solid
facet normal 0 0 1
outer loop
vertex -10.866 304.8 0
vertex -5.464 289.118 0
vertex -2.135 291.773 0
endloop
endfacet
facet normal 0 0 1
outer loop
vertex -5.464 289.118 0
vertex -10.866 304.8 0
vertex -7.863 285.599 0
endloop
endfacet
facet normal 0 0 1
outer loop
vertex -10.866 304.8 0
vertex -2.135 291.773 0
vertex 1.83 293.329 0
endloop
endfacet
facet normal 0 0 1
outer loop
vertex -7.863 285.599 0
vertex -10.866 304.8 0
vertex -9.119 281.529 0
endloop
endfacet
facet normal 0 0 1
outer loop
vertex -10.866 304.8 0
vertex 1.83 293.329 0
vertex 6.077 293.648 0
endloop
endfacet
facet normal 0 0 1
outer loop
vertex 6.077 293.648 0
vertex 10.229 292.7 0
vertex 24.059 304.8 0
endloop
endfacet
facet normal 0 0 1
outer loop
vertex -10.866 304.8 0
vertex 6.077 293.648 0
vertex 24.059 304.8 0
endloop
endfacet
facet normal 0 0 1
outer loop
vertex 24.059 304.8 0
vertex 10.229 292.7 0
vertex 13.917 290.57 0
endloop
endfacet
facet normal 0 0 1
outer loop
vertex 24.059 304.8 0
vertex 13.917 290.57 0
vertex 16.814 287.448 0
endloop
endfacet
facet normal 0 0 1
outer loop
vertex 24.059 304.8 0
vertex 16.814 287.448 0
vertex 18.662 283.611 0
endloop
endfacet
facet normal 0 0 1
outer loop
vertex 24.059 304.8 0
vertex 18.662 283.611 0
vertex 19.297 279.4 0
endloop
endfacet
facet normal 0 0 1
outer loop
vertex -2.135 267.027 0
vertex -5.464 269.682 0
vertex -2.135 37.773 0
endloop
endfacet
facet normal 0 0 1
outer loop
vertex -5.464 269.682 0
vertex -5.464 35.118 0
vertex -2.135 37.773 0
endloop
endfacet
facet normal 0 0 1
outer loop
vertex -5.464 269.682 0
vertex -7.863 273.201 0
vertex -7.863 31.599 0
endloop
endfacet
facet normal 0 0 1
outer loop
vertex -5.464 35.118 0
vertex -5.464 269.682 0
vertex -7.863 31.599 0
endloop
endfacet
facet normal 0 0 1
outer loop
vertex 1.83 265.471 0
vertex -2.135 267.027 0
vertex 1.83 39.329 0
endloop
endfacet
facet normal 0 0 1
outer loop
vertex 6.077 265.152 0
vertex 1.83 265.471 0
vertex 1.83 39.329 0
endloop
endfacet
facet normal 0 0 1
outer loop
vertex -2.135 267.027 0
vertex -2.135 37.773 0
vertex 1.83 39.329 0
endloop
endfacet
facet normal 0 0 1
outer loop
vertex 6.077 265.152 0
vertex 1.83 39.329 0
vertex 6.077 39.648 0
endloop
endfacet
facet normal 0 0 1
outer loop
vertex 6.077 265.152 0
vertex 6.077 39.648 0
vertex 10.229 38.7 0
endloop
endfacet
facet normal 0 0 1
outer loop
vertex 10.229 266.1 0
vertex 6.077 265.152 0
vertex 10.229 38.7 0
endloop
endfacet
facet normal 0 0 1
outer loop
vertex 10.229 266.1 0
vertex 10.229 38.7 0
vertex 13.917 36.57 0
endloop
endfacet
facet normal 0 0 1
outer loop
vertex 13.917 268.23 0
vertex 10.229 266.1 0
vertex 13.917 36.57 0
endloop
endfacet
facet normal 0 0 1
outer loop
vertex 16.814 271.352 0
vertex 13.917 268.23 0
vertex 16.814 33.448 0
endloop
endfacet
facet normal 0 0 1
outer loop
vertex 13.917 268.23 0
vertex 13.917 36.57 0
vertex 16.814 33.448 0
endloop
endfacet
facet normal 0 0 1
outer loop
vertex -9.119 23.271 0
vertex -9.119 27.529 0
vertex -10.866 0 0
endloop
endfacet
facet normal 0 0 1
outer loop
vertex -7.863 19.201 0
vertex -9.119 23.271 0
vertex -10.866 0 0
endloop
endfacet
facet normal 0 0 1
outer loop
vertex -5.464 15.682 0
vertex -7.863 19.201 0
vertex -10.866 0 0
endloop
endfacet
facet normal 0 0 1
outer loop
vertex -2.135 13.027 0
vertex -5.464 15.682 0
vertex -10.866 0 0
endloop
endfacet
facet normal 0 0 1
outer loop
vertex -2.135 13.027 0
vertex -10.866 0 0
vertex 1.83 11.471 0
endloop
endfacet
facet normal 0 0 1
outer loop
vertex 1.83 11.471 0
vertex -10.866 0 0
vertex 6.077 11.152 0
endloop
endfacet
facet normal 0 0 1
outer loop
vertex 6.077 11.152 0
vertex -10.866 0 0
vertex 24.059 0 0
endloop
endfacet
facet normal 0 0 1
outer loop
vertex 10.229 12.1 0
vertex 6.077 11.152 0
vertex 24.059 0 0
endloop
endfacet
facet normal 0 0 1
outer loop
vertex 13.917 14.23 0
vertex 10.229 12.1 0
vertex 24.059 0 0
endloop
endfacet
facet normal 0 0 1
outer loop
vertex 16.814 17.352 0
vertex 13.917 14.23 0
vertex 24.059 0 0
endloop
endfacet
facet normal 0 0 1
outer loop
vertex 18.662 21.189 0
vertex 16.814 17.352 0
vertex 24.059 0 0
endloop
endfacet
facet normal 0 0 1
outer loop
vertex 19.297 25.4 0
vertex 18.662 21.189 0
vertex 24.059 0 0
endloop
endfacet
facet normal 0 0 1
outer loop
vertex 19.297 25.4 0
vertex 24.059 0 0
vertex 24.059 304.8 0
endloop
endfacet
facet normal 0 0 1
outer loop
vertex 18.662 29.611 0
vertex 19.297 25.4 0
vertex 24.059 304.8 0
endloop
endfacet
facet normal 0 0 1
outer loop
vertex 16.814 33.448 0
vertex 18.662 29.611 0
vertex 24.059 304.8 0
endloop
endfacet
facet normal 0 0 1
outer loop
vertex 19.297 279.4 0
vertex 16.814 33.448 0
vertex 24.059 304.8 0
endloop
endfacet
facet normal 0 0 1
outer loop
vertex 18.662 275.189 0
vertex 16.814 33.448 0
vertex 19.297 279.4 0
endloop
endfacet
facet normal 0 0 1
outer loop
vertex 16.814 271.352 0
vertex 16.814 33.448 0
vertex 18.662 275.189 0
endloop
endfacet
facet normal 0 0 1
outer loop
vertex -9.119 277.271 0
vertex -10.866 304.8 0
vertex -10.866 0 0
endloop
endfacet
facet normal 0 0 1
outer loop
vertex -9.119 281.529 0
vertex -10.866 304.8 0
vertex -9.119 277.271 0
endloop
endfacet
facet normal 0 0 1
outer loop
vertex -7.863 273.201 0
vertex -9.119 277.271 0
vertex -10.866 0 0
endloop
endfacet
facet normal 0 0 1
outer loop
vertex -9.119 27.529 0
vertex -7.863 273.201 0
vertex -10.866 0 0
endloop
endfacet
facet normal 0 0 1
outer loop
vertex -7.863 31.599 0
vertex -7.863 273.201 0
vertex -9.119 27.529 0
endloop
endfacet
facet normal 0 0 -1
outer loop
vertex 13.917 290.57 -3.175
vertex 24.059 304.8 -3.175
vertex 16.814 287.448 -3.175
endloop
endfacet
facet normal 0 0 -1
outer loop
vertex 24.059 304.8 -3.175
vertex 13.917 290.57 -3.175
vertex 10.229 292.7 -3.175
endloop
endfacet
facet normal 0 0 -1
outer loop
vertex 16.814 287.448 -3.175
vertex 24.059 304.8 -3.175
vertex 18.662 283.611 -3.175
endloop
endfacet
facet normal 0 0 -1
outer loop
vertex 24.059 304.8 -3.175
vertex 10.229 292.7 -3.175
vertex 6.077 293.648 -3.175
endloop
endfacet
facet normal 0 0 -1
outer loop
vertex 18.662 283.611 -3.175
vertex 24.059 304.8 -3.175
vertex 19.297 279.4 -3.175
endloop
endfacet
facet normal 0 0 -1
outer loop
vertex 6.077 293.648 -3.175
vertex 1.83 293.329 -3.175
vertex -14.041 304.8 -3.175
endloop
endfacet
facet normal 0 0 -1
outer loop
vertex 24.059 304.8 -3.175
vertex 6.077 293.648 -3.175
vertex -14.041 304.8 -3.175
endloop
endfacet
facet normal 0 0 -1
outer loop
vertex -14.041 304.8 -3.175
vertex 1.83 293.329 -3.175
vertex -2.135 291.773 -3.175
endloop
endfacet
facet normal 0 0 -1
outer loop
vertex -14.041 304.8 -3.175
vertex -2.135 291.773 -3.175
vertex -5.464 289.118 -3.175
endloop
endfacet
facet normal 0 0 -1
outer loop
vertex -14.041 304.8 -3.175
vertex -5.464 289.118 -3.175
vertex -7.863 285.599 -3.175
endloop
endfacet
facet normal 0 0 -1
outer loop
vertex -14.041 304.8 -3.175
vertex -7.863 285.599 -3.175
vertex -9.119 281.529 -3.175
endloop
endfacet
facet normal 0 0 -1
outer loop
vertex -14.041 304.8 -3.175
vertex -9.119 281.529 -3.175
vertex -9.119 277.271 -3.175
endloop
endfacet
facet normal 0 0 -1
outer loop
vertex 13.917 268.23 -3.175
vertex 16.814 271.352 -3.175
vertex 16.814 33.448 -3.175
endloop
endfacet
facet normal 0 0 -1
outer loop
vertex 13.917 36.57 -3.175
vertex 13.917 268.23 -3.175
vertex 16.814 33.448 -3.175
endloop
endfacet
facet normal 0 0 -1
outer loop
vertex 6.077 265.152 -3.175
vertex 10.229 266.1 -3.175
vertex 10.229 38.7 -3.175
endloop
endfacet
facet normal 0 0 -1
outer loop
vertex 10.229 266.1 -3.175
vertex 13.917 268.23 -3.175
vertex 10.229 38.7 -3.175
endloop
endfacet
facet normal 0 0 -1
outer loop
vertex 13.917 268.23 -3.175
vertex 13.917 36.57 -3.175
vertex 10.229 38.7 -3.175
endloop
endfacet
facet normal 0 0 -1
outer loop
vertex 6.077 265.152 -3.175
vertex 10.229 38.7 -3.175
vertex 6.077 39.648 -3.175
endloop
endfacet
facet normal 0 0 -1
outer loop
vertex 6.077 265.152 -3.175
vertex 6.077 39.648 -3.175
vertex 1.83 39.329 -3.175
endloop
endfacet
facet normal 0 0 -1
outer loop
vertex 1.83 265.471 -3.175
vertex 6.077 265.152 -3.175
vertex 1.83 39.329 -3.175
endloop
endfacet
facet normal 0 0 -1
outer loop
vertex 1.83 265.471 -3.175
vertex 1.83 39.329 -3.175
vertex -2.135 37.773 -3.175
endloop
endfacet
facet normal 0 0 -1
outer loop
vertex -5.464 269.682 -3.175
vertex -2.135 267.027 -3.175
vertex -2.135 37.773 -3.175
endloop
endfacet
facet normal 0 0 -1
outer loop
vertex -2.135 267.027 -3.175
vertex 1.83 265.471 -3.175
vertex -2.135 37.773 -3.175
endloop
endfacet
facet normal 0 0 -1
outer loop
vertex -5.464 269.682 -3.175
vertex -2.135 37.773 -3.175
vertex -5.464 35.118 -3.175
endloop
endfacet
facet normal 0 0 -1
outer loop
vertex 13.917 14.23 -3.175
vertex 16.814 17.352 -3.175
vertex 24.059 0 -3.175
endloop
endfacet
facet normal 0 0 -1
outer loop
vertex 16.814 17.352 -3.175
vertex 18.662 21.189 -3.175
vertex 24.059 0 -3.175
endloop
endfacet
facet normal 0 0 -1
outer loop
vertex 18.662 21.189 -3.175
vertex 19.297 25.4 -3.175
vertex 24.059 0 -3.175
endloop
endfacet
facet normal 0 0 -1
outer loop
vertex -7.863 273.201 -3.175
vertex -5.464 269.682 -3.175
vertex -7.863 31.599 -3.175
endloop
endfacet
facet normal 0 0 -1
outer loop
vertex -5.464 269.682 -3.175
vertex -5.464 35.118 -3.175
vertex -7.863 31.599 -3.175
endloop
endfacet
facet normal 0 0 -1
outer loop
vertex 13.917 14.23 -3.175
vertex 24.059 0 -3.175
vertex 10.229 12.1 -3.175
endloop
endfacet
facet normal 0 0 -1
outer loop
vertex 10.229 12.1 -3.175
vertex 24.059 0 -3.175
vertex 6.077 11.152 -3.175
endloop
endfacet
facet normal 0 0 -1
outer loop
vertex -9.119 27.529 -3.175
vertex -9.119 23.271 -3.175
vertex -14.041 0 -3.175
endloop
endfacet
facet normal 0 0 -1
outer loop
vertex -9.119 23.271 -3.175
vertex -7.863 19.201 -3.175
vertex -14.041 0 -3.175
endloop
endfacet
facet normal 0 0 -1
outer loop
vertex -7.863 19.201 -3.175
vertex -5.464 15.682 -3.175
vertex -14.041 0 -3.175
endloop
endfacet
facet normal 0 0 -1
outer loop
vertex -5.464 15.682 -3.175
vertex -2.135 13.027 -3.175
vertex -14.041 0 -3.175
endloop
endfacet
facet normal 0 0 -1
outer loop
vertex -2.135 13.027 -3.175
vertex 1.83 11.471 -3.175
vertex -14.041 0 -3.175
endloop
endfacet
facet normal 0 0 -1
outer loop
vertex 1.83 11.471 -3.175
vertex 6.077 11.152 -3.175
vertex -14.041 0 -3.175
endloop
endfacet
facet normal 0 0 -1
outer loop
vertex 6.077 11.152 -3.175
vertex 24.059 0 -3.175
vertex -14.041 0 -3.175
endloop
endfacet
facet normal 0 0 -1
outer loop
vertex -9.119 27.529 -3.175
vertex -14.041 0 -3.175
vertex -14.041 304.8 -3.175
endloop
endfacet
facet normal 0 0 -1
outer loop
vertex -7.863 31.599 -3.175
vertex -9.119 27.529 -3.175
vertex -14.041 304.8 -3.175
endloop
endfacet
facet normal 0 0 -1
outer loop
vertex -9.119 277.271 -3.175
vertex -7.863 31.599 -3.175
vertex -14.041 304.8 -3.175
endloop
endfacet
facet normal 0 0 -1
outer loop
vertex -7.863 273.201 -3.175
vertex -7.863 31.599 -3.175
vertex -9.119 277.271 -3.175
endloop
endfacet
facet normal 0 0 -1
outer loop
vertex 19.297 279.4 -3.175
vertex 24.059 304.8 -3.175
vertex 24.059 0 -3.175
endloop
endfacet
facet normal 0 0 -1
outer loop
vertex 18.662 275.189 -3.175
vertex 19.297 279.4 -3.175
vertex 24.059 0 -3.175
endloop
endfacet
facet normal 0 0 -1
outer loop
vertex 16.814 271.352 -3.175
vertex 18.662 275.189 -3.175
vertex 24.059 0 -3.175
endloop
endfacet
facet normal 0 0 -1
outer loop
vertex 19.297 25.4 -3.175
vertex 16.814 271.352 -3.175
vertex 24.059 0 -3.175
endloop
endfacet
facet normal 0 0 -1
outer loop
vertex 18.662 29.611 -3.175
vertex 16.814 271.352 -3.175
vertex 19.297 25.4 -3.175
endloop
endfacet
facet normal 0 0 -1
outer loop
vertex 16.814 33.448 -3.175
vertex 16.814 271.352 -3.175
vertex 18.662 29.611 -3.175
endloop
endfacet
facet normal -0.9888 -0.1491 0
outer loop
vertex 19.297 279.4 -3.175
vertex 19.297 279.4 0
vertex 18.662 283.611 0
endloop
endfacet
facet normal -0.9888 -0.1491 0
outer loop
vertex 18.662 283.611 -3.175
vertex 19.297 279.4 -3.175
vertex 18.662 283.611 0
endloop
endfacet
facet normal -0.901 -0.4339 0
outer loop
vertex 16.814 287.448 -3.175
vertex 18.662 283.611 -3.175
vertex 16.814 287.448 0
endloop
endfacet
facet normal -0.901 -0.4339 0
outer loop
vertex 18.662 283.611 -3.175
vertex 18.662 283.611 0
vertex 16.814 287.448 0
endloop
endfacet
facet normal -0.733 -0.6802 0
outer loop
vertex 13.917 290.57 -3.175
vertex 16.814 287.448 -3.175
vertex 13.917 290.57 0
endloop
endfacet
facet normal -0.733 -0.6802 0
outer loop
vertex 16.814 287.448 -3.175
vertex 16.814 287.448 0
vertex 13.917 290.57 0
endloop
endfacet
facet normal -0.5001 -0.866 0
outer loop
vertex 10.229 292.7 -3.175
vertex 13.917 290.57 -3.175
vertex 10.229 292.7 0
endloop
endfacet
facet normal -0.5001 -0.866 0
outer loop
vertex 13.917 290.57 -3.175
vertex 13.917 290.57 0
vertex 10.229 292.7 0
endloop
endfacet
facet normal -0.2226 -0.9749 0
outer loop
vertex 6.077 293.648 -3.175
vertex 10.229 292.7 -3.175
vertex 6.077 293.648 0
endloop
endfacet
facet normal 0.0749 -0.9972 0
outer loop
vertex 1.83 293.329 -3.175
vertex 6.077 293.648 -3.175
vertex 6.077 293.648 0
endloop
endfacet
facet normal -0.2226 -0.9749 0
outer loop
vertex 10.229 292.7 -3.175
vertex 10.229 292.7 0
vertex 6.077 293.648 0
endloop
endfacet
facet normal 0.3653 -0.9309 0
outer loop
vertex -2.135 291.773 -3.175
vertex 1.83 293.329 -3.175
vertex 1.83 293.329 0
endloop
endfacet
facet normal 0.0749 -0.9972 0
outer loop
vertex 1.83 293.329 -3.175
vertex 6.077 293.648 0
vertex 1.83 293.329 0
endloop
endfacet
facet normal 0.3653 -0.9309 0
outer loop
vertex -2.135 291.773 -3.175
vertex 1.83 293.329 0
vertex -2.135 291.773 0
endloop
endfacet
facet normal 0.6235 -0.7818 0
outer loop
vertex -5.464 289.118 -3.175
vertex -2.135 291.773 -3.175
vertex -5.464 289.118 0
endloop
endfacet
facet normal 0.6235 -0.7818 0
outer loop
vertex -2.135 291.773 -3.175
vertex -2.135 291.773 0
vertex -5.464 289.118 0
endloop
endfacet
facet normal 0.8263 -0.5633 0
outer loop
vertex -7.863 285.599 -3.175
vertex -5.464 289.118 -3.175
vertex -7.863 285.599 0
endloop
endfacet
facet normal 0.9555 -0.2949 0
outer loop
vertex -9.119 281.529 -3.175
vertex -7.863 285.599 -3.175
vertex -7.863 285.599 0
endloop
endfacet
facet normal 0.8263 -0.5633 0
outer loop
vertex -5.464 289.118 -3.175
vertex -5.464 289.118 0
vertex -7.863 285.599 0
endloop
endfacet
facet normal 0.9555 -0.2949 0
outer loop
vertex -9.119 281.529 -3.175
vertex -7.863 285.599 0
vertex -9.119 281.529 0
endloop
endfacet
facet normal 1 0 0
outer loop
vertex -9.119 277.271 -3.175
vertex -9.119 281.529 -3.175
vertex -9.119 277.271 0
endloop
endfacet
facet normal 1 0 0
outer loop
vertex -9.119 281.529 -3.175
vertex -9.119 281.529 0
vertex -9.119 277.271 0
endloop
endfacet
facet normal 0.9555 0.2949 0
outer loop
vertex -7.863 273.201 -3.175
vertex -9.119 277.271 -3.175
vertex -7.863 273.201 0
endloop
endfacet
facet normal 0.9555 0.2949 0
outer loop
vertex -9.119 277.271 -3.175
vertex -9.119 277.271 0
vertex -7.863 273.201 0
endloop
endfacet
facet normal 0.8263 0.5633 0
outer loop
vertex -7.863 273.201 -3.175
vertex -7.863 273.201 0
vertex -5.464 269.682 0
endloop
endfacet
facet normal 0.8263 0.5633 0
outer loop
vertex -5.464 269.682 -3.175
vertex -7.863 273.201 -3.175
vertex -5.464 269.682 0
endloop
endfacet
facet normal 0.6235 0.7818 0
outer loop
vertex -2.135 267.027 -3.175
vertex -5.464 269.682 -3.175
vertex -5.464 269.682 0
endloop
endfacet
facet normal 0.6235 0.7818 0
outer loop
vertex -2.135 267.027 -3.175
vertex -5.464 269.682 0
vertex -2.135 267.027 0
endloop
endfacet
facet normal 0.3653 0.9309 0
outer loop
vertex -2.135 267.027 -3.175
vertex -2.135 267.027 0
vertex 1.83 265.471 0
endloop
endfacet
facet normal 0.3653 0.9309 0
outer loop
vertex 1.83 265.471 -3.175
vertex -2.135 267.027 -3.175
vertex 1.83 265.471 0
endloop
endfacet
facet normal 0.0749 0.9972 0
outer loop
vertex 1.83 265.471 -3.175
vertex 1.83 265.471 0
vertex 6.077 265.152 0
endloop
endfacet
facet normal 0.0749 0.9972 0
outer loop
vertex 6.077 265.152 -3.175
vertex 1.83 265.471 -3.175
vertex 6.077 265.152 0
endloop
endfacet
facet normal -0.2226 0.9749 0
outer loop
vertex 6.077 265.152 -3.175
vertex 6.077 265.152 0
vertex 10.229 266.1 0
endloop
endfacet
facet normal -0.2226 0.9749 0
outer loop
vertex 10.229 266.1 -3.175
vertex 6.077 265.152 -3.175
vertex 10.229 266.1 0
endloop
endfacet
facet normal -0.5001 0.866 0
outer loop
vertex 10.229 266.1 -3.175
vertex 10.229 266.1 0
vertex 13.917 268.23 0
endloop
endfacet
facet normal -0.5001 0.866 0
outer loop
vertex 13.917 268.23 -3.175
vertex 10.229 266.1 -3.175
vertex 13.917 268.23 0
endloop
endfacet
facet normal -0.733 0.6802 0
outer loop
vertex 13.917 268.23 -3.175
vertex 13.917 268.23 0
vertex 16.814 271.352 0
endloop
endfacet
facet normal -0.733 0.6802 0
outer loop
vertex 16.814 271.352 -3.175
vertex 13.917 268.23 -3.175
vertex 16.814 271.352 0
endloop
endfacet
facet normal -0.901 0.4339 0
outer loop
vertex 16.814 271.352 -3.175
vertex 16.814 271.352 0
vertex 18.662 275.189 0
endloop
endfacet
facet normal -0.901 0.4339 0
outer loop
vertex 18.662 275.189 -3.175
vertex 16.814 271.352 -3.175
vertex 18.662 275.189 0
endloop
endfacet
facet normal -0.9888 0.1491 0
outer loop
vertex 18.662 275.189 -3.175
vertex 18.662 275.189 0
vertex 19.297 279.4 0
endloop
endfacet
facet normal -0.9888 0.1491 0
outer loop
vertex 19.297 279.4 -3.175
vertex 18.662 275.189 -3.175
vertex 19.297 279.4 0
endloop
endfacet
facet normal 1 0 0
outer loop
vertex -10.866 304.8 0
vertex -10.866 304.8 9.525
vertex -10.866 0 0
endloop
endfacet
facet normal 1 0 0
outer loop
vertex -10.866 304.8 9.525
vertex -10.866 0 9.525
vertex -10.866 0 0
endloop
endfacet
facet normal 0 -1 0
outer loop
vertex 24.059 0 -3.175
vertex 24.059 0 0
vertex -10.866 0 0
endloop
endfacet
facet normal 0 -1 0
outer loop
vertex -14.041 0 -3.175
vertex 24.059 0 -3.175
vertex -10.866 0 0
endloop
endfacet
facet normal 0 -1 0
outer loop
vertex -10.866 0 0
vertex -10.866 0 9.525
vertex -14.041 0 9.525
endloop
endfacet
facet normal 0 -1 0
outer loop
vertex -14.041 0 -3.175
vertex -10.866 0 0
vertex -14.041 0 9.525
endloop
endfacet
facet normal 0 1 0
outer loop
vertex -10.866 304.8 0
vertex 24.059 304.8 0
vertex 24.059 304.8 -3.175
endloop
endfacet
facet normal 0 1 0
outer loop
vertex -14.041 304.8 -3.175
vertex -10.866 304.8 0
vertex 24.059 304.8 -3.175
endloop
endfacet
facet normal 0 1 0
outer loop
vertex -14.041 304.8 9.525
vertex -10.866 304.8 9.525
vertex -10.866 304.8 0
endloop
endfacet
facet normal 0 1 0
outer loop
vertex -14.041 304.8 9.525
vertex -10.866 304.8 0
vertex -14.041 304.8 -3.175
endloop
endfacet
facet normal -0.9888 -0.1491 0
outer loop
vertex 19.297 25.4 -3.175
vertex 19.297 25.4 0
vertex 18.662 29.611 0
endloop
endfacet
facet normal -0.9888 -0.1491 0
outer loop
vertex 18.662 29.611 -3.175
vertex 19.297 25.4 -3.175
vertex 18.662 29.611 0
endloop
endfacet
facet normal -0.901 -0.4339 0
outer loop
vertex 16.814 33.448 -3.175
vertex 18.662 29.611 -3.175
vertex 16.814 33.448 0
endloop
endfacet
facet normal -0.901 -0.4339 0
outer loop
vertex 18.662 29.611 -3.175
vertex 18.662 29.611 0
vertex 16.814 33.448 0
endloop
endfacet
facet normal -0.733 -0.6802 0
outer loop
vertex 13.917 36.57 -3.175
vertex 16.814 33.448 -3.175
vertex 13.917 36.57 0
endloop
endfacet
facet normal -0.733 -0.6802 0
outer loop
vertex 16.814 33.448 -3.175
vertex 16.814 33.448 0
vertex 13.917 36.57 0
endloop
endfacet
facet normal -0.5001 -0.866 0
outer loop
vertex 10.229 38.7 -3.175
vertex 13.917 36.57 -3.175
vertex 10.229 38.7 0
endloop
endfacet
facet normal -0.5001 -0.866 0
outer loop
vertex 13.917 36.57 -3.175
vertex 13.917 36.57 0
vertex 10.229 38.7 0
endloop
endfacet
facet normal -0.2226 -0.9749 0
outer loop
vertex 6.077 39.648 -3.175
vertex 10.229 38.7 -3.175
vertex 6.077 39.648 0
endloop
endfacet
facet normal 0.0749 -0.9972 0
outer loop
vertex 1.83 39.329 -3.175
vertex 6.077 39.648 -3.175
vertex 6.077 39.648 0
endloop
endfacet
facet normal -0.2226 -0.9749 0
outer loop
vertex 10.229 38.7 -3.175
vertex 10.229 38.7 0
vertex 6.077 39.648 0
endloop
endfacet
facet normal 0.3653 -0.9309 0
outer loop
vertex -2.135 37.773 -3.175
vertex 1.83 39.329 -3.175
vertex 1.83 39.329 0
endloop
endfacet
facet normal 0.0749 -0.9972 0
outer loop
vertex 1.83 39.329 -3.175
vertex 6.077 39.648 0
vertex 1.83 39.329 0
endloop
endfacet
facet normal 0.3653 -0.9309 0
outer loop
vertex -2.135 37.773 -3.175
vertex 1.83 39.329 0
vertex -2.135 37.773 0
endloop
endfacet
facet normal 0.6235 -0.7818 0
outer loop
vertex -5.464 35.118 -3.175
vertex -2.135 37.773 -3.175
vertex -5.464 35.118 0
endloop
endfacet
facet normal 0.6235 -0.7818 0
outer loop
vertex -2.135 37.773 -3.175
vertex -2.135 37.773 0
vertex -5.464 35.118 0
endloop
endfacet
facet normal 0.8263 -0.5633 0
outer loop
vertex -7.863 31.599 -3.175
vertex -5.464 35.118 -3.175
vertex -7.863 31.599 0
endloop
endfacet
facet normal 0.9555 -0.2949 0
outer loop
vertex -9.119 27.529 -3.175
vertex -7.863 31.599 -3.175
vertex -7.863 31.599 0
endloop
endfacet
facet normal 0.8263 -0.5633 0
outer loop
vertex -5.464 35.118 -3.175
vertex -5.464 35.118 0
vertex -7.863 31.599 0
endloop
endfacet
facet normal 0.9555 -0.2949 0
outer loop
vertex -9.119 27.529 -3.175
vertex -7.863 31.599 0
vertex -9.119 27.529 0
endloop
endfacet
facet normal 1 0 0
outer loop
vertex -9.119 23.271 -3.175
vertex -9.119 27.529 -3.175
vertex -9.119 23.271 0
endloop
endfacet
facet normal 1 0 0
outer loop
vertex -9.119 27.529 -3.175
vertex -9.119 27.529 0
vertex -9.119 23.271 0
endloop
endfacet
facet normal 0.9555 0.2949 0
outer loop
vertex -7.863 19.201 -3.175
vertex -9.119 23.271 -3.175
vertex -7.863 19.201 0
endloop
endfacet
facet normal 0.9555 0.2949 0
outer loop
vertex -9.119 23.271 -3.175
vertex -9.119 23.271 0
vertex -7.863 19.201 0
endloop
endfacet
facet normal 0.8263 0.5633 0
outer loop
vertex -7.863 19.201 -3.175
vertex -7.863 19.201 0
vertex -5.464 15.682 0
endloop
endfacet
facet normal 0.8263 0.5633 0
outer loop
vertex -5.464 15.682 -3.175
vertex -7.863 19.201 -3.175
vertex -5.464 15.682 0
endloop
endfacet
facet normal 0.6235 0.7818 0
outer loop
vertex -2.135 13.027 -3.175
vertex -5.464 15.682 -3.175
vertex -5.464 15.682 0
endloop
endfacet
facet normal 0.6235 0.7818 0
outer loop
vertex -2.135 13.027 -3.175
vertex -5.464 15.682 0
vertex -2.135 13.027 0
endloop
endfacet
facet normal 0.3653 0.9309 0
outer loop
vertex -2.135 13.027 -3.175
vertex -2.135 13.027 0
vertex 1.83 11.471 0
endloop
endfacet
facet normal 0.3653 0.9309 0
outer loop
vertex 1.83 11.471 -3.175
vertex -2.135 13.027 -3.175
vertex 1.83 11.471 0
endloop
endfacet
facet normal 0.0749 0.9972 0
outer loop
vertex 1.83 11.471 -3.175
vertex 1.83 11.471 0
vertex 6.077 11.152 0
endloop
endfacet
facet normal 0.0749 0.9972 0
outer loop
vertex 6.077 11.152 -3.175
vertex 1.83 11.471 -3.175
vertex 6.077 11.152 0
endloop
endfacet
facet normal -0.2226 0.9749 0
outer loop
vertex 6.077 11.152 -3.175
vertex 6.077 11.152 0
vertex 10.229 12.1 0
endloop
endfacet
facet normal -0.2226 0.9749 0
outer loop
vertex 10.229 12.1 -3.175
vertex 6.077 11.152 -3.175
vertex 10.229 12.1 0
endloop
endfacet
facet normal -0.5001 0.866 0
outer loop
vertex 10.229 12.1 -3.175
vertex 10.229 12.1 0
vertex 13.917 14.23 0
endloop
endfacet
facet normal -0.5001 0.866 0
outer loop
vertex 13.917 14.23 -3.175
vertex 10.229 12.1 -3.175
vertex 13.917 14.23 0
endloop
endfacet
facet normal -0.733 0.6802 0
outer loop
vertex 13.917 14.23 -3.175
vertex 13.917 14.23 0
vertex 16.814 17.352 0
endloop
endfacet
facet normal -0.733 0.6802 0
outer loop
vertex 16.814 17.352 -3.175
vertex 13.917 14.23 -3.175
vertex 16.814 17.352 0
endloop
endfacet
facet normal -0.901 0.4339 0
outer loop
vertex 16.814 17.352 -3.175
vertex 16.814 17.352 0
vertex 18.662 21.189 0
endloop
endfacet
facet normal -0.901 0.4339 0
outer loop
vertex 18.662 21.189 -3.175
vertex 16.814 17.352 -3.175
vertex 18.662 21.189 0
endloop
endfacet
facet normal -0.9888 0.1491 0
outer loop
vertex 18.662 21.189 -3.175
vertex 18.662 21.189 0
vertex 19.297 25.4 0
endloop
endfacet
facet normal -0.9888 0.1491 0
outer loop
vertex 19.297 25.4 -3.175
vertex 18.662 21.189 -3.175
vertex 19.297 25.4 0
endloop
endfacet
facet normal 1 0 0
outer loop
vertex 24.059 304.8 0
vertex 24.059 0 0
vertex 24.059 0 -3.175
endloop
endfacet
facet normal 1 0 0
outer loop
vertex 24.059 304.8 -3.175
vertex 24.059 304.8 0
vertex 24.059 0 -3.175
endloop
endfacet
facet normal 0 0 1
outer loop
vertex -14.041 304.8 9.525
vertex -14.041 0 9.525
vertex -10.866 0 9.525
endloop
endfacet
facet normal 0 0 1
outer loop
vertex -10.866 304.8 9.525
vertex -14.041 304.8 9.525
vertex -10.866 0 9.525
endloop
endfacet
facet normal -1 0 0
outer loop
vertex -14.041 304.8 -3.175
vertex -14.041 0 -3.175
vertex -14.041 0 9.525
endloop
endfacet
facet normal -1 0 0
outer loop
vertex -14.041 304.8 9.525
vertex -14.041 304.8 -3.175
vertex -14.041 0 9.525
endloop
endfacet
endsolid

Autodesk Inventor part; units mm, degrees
ref_plane "YZ Plane" through (0, 0, 0) normal (1, 0, 0) x (0, 1, 0)
ref_plane "XZ Plane" through (0, 0, 0) normal (0, 1, 0) x (-1, 0, 0)
ref_plane "XY Plane" through (0, 0, 0) normal (0, 0, 1) x (1, 0, 0)
sketch "Sketch1" plane through (0, 0, 0) normal (0, 1, 0) x (-1, 0, 0)
  line L0 (14.0408, 9.525) -> (10.8658, 9.525)
  line L1 (-24.0592, 0) -> (-24.0592, -3.175)
  line L2 (-24.0592, -3.175) -> (14.0408, -3.175)
  line L3 (14.0408, -3.175) -> (14.0408, 9.525)
  line L4 (10.8658, 9.525) -> (10.8658, 0)
  line L5 (10.8658, 0) -> (-24.0592, 0)
  point P0 (0, 0)
  dimension "d0" = 38.1
  dimension "d1" = 12.7
  dimension "d2" = 3.175
  dimension "d3" = 3.175
extrude "Extrusion1" add sketch "Sketch1" along normal blind 304.8
sketch "Sketch2" plane through (-10.8658, 0, 0) normal (0, 0, 1) x (1, 0, 0)
  circle A0 centre (15.875, 25.4) radius 14.2875
  line L0 (34.925, 0) -> (34.925, 304.8) projected
  line L1 (0, 0) -> (34.925, 0) projected
  circle A1 centre (15.875, 279.4) radius 14.2875
  line L2 (0, 304.8) -> (34.925, 304.8) projected
  point P0 (10.8658, 0)
  dimension "d6" = 19.05
  dimension "d7" = 25.4
  dimension "d8" = 19.05
  dimension "d9" = 25.4
  dimension "d12" = 28.575
  dimension "d13" = 28.575
extrude "Extrusion2" cut sketch "Sketch2" against normal through all
equation "\"d10\" = d7"
properties part number "arm"
